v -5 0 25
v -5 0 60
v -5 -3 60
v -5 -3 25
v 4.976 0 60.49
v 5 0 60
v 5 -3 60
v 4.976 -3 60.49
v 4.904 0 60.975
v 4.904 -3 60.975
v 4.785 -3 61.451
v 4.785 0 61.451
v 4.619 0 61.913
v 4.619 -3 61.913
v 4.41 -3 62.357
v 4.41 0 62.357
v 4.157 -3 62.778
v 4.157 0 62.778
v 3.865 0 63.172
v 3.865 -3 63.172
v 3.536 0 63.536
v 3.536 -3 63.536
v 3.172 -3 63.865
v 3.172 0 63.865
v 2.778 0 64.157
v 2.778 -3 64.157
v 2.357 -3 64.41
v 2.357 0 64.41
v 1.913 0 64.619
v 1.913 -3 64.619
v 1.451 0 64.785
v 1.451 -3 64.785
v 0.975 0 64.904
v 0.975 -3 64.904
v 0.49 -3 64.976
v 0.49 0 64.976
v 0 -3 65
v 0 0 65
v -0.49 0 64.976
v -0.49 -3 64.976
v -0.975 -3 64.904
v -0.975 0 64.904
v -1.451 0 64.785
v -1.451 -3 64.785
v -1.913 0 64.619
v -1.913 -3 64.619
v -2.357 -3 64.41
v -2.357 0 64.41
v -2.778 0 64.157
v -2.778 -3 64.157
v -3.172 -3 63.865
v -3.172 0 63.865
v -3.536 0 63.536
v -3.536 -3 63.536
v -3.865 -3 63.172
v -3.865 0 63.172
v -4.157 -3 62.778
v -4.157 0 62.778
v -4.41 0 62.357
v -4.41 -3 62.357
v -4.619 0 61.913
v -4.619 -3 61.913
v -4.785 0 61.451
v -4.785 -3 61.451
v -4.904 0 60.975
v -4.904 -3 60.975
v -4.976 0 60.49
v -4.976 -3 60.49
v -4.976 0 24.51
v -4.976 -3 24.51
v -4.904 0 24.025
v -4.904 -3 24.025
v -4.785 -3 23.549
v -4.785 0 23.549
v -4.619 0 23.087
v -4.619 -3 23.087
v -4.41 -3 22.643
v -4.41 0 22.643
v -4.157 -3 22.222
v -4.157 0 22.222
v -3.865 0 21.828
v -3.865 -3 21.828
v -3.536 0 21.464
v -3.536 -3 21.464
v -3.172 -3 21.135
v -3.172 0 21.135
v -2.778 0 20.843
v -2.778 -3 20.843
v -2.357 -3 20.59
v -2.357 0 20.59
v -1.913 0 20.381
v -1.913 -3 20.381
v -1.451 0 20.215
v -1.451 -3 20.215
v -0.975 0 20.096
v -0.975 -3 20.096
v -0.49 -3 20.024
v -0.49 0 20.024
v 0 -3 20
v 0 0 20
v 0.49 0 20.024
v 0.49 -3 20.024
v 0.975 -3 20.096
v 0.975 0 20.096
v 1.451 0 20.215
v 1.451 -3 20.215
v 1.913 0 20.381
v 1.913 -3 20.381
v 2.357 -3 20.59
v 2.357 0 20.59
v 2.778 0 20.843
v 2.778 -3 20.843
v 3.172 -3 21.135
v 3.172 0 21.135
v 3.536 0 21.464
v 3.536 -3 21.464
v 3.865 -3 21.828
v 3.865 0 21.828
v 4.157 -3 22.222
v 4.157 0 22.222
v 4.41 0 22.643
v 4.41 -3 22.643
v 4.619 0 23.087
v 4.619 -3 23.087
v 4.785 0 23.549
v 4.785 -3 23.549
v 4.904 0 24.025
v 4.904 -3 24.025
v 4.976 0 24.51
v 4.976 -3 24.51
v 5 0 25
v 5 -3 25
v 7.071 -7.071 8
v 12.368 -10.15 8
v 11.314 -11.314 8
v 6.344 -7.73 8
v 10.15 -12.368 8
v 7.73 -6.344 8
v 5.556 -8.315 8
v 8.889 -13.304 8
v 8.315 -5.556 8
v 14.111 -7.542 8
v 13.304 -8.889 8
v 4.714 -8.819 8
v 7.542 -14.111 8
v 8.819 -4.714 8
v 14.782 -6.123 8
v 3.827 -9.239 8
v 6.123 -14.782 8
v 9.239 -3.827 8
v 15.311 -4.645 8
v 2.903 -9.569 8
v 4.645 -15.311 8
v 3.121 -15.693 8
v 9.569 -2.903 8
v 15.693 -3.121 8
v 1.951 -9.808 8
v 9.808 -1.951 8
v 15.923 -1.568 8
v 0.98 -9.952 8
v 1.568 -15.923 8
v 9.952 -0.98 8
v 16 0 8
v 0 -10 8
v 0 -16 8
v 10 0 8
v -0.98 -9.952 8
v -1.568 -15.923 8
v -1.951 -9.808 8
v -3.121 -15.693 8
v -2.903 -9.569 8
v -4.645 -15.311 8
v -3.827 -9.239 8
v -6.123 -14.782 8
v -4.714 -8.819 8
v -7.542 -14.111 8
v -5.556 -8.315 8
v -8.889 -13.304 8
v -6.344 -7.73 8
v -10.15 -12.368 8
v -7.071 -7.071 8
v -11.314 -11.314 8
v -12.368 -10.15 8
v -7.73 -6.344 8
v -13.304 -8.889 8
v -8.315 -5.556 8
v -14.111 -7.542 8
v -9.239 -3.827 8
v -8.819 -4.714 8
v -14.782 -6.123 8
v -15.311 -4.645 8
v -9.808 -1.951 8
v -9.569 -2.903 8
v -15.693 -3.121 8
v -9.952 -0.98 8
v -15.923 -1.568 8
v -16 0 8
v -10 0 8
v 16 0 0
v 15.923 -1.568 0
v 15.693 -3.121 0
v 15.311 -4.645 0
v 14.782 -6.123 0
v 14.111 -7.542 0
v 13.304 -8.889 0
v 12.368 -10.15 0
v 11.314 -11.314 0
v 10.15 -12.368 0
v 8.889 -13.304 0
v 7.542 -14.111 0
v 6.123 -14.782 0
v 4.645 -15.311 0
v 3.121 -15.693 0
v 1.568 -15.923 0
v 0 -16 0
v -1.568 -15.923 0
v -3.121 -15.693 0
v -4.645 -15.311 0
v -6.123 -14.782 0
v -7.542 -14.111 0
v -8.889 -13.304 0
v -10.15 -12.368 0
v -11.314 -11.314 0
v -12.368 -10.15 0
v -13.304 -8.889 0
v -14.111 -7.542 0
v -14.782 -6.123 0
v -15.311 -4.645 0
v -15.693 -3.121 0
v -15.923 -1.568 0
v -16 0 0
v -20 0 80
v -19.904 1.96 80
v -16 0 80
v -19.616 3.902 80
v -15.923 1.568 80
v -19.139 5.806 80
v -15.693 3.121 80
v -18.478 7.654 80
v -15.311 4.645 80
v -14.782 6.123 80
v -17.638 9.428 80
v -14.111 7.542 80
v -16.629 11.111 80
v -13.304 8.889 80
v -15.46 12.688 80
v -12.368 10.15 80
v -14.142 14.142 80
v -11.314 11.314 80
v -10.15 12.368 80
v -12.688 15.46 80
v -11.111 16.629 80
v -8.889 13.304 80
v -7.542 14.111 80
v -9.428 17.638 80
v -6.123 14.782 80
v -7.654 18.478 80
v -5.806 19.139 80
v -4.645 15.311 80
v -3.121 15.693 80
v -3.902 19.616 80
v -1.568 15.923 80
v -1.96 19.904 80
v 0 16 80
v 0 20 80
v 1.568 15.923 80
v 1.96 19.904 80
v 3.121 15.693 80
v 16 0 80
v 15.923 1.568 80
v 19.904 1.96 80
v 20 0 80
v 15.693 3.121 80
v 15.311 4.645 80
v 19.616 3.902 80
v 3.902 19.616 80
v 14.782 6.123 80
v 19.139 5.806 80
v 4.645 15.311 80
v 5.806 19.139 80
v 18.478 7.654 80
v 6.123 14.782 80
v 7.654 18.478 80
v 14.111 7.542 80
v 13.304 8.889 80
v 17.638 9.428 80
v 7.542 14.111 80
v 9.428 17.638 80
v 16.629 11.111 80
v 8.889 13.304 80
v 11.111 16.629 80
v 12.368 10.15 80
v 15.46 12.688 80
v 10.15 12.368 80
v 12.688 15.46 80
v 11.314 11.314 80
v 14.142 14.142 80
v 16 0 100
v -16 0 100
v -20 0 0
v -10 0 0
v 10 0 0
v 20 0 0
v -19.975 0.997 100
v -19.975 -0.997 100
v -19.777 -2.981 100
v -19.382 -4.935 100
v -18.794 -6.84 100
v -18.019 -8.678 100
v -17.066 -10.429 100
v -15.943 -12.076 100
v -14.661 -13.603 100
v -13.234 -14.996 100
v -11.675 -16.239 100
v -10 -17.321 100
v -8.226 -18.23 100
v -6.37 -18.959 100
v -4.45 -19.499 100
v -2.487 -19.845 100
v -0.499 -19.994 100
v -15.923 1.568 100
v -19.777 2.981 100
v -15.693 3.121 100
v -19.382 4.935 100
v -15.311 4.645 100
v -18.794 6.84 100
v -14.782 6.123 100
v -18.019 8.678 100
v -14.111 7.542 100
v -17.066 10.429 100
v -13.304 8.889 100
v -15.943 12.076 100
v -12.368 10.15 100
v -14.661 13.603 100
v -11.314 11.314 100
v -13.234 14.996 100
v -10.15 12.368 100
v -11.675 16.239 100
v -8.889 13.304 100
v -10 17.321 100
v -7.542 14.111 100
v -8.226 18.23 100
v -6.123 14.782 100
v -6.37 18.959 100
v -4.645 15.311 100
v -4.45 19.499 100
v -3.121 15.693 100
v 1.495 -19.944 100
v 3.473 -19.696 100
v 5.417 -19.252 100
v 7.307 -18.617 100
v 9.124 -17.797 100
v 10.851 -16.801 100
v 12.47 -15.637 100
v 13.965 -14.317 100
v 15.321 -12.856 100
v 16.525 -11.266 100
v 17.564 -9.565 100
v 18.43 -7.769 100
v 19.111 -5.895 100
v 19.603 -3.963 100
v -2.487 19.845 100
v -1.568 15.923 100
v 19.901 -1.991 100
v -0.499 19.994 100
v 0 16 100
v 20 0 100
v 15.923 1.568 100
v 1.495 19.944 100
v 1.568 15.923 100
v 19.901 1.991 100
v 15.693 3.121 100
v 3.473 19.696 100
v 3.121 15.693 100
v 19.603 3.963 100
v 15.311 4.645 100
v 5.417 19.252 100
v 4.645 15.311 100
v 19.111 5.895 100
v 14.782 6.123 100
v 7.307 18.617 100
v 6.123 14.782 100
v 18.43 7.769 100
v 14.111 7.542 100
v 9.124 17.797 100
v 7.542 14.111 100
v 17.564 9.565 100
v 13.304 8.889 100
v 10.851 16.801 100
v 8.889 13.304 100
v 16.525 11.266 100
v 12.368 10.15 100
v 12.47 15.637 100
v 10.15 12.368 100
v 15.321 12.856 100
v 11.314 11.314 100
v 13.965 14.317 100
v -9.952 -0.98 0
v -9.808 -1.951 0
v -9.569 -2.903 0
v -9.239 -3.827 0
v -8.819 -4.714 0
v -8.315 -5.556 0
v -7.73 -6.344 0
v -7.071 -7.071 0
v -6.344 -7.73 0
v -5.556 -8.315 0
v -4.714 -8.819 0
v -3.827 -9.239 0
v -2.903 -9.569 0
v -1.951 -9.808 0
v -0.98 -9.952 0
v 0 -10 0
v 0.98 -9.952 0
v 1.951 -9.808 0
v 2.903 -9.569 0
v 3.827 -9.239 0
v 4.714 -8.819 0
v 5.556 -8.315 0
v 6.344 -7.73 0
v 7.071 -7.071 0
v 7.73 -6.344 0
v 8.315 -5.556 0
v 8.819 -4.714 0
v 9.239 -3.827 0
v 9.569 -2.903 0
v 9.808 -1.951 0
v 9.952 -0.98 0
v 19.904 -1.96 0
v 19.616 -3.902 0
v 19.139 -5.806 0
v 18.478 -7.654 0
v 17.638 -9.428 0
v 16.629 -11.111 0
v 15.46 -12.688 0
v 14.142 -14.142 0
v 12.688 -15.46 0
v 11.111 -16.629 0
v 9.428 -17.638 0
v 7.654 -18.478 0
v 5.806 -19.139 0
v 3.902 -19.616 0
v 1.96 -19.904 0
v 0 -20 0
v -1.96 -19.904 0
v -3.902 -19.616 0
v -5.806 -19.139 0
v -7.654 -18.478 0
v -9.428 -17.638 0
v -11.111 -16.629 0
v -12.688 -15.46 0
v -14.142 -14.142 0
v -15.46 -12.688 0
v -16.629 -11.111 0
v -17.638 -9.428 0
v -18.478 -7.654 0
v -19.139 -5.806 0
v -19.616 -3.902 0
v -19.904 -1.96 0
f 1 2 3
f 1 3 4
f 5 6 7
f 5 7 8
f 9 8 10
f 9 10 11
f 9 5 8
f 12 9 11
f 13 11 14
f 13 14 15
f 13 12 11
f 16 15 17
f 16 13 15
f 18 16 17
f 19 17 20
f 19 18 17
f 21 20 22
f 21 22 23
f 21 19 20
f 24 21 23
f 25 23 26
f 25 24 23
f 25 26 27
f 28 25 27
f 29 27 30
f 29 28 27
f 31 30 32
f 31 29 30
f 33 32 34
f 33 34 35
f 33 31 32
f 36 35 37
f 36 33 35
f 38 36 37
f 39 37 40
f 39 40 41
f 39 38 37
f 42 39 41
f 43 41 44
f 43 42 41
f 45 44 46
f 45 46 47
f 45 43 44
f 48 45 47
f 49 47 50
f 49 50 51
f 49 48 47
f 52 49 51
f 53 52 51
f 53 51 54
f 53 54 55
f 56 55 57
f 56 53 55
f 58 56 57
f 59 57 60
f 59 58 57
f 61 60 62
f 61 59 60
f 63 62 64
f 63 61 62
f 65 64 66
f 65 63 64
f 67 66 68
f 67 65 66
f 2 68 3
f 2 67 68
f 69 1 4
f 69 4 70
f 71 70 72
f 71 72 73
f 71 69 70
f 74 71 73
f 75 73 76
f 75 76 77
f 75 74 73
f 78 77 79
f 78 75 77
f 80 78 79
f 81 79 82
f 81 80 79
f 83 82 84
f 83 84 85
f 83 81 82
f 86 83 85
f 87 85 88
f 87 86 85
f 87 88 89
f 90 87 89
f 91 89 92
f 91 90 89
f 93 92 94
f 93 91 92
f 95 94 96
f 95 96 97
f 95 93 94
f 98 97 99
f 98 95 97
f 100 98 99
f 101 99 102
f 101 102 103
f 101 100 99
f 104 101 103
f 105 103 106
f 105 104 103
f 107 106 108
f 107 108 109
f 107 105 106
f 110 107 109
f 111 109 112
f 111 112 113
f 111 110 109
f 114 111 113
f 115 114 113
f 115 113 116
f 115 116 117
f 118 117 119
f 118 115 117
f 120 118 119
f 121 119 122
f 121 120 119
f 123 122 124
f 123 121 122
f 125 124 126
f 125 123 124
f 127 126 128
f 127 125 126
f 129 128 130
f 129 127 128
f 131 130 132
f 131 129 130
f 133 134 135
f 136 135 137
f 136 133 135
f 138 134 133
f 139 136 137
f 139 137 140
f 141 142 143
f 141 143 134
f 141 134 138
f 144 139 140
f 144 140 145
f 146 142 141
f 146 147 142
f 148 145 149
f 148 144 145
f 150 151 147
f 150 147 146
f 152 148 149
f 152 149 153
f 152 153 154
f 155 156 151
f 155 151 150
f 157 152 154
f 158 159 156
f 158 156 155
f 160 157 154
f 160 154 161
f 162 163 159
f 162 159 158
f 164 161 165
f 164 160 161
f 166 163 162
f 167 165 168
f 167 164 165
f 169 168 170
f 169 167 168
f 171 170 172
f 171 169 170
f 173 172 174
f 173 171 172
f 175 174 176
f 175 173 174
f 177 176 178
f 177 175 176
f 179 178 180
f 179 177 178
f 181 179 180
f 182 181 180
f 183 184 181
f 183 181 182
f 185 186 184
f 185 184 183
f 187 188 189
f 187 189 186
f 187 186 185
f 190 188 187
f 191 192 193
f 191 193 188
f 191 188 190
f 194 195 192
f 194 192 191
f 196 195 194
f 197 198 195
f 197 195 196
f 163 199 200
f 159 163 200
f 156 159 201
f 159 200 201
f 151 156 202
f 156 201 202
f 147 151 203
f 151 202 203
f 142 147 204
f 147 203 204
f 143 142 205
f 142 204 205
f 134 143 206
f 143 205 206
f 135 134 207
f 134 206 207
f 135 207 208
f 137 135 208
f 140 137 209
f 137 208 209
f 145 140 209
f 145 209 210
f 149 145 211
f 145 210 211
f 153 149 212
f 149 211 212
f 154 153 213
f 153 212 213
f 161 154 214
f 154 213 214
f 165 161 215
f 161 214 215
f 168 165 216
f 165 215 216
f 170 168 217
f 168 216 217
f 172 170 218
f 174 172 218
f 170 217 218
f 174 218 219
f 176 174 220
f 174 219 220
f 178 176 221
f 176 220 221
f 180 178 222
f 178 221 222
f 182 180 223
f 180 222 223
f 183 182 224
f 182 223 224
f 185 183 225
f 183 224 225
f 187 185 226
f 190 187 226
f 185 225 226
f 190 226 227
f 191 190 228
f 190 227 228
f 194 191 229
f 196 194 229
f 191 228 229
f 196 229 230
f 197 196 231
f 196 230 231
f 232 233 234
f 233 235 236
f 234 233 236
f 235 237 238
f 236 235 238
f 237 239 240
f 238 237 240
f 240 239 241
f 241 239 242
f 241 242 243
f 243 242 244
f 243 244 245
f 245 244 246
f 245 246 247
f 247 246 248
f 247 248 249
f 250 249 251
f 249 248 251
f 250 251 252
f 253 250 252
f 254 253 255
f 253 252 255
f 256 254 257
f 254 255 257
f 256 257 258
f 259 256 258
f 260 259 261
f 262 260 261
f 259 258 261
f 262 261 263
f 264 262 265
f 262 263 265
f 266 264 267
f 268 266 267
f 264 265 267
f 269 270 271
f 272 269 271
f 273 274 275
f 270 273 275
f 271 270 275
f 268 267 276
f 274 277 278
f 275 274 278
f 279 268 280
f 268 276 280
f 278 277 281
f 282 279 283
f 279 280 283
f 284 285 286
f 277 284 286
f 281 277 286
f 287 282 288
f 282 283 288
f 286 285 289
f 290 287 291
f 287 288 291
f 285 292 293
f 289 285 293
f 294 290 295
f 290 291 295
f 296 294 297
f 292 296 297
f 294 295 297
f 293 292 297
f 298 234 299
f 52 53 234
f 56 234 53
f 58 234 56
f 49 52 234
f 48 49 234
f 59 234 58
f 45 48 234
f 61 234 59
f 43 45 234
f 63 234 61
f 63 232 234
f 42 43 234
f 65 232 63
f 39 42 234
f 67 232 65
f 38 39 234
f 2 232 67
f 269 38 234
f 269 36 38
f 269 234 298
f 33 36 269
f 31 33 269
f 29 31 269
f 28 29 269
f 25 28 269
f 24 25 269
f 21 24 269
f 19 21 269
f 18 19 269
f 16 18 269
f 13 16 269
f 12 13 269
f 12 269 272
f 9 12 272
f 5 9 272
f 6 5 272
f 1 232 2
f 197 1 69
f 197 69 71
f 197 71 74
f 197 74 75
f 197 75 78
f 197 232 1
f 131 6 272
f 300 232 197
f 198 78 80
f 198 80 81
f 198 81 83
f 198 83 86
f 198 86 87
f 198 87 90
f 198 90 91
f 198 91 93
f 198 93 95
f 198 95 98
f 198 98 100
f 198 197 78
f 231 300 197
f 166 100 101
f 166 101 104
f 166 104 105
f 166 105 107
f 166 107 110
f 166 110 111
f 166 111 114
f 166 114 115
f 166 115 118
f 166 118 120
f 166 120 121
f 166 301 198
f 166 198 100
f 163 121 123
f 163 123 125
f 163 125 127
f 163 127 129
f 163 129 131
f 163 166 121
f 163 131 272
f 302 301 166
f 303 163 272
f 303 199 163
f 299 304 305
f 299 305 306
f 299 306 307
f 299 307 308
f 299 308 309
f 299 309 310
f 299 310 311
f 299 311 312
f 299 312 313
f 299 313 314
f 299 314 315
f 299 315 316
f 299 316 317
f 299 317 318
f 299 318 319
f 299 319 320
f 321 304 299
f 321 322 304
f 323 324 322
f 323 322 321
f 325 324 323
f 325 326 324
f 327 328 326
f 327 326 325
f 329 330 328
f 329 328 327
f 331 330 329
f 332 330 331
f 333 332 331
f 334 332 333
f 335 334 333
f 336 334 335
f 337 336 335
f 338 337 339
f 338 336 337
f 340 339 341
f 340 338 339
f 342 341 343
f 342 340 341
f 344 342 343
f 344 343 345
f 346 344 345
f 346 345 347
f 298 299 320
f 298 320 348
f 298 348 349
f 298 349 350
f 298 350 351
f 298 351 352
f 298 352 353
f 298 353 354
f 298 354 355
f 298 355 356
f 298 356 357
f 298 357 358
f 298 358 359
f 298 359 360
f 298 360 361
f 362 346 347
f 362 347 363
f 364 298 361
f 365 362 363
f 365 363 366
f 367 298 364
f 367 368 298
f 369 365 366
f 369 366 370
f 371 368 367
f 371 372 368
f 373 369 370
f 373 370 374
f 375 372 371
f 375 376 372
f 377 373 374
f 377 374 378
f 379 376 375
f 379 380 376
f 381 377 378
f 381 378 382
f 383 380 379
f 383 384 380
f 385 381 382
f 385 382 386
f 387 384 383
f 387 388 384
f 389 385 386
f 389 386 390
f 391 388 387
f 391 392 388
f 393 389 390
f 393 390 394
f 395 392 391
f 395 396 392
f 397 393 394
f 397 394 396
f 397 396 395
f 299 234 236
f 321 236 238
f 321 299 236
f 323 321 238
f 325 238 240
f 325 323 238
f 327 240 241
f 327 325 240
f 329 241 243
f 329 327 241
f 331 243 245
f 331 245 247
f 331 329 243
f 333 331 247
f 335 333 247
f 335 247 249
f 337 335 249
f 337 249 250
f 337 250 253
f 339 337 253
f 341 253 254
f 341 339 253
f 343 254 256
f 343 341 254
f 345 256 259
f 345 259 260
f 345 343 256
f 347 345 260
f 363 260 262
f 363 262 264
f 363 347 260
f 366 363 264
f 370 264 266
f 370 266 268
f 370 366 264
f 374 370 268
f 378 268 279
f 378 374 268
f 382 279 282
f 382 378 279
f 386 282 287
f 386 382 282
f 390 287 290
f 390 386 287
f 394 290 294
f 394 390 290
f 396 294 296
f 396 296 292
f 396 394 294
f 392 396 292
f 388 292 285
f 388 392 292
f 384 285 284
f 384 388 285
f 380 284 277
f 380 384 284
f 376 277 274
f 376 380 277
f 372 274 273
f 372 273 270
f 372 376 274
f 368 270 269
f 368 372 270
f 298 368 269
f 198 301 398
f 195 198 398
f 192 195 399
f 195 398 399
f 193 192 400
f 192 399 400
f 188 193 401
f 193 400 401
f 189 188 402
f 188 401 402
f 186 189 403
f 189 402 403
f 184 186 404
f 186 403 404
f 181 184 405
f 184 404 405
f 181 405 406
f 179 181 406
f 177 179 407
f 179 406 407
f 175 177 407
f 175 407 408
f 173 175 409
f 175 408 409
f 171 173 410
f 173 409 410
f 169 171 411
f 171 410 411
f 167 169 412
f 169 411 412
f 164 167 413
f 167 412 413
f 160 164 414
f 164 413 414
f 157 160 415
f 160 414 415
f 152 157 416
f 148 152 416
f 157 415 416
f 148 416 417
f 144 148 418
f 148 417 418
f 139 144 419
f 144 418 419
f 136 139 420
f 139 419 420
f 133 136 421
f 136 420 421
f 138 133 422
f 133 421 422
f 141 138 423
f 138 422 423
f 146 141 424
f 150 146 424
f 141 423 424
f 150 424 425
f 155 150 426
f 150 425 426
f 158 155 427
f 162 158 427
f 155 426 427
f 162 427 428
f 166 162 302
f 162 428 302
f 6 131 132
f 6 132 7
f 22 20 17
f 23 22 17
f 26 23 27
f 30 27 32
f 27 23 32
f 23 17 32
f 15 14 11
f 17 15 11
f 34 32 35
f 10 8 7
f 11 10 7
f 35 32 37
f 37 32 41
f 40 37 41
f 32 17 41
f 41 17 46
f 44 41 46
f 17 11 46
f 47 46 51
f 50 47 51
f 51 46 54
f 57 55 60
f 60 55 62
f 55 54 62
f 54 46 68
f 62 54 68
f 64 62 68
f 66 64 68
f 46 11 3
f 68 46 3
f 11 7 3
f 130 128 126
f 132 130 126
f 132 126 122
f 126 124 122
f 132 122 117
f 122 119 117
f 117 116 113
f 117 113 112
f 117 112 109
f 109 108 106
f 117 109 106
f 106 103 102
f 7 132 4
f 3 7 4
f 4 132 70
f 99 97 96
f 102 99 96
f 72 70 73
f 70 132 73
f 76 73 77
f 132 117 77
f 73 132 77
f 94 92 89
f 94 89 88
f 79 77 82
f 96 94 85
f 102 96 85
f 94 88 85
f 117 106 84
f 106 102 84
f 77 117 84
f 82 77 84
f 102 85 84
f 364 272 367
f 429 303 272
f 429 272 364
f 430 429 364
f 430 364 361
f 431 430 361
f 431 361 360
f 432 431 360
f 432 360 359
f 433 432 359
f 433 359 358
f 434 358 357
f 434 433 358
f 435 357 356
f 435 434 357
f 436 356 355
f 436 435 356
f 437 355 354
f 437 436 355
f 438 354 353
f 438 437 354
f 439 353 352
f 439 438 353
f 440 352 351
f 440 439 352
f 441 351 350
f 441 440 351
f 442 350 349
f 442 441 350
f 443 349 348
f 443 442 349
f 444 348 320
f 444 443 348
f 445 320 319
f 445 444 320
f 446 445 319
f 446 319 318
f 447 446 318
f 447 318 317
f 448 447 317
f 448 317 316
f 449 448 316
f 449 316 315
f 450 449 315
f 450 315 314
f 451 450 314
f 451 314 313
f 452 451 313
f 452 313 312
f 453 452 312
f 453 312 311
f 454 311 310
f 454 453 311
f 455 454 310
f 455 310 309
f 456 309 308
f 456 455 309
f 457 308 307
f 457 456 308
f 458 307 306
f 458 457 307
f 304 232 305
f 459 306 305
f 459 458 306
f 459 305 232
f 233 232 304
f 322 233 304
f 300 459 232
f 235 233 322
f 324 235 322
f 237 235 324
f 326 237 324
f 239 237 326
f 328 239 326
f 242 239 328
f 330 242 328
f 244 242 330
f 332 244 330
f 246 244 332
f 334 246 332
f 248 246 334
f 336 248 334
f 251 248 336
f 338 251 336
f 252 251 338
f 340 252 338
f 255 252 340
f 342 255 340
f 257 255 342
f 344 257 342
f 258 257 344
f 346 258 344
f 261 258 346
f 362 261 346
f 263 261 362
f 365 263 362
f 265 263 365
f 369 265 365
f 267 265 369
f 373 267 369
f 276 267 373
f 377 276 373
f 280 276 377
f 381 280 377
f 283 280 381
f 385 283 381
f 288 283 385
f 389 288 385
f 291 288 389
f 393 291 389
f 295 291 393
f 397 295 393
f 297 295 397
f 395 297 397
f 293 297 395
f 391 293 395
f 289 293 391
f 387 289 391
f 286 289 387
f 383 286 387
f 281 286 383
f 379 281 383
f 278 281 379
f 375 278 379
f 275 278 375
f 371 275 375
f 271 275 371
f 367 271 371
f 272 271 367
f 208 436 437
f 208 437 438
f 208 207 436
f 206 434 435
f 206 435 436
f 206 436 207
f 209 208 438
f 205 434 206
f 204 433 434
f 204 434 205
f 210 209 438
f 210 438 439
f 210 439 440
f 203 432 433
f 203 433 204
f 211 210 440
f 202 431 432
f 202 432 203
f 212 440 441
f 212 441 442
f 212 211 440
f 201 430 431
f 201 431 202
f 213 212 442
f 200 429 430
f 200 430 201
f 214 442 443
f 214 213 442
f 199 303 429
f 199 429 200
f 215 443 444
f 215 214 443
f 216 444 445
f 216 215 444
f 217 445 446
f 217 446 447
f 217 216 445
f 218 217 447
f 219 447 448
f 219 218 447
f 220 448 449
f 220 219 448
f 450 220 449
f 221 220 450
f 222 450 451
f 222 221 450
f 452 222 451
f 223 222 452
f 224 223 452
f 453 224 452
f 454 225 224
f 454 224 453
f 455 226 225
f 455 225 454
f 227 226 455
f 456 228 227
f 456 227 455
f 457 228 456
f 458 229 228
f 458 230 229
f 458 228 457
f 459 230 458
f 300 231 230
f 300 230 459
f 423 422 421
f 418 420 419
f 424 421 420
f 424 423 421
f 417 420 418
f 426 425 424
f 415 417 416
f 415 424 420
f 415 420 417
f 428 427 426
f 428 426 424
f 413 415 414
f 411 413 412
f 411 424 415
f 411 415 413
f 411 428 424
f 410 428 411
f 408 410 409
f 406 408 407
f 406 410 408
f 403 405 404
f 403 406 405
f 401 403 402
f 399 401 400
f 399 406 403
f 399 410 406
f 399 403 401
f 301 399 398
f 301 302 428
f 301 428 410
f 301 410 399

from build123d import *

# Parameters (mm, degrees)
BOSS_EXTRUDE1_DEPTH = 100
CUT_EXTRUDE1_DEPTH  = 8
CUT_EXTRUDE2_DEPTH  = 3
BOSS_EXTRUDE4_DEPTH = 20


with BuildPart() as part:
    # Sketch1 → Boss-Extrude1 (new body)
    with BuildSketch(Plane.XY):
        with BuildLine():
            Line((-20, 0), (-16, 0))
            Line((-16, 0), (-10, 0))
            Line((-10, 0), (0, 0))
            Line((0, 0), (10, 0))
            Line((10, 0), (16, 0))
            Line((16, 0), (20, 0))
            ThreePointArc((20, 0), (0, -20), (-20, 0))
        make_face()
    extrude(amount=BOSS_EXTRUDE1_DEPTH)

    # Sketch2 → Cut-Extrude1 (cut)
    with BuildSketch(Plane(origin=(0, 0, 0), x_dir=(-1, 0, 0), z_dir=(0, 0, -1))):
        with BuildLine():
            Line((-10, 0), (-16, 0))
            ThreePointArc((-16, 0), (0, -16), (16, 0))
            Line((16, 0), (10, 0))
            ThreePointArc((10, 0), (0, -10), (-10, 0))
        make_face()
    extrude(amount=-CUT_EXTRUDE1_DEPTH, mode=Mode.SUBTRACT)

    # Sketch3 → Cut-Extrude2 (cut)
    with BuildSketch(Plane(origin=(0, 0, 0), x_dir=(1, 0, 0), z_dir=(0, 1, 0))):
        with BuildLine():
            Line((5, -25), (5, -60))
            ThreePointArc((5, -60), (0, -65), (-5, -60))
            Line((-5, -60), (-5, -25))
            ThreePointArc((-5, -25), (0, -20), (5, -25))
        make_face()
    extrude(amount=-CUT_EXTRUDE2_DEPTH, mode=Mode.SUBTRACT)

    # Sketch4 → Boss-Extrude4 (add)
    with BuildSketch(Plane.XY.offset(100)):
        with BuildLine():
            Line((-20, 0), (-16, 0))
            ThreePointArc((-16, 0), (0, 16), (16, 0))
            Line((16, 0), (20, 0))
            ThreePointArc((20, 0), (0, 20), (-20, 0))
        make_face()
    extrude(amount=-BOSS_EXTRUDE4_DEPTH)


solid = part.part
